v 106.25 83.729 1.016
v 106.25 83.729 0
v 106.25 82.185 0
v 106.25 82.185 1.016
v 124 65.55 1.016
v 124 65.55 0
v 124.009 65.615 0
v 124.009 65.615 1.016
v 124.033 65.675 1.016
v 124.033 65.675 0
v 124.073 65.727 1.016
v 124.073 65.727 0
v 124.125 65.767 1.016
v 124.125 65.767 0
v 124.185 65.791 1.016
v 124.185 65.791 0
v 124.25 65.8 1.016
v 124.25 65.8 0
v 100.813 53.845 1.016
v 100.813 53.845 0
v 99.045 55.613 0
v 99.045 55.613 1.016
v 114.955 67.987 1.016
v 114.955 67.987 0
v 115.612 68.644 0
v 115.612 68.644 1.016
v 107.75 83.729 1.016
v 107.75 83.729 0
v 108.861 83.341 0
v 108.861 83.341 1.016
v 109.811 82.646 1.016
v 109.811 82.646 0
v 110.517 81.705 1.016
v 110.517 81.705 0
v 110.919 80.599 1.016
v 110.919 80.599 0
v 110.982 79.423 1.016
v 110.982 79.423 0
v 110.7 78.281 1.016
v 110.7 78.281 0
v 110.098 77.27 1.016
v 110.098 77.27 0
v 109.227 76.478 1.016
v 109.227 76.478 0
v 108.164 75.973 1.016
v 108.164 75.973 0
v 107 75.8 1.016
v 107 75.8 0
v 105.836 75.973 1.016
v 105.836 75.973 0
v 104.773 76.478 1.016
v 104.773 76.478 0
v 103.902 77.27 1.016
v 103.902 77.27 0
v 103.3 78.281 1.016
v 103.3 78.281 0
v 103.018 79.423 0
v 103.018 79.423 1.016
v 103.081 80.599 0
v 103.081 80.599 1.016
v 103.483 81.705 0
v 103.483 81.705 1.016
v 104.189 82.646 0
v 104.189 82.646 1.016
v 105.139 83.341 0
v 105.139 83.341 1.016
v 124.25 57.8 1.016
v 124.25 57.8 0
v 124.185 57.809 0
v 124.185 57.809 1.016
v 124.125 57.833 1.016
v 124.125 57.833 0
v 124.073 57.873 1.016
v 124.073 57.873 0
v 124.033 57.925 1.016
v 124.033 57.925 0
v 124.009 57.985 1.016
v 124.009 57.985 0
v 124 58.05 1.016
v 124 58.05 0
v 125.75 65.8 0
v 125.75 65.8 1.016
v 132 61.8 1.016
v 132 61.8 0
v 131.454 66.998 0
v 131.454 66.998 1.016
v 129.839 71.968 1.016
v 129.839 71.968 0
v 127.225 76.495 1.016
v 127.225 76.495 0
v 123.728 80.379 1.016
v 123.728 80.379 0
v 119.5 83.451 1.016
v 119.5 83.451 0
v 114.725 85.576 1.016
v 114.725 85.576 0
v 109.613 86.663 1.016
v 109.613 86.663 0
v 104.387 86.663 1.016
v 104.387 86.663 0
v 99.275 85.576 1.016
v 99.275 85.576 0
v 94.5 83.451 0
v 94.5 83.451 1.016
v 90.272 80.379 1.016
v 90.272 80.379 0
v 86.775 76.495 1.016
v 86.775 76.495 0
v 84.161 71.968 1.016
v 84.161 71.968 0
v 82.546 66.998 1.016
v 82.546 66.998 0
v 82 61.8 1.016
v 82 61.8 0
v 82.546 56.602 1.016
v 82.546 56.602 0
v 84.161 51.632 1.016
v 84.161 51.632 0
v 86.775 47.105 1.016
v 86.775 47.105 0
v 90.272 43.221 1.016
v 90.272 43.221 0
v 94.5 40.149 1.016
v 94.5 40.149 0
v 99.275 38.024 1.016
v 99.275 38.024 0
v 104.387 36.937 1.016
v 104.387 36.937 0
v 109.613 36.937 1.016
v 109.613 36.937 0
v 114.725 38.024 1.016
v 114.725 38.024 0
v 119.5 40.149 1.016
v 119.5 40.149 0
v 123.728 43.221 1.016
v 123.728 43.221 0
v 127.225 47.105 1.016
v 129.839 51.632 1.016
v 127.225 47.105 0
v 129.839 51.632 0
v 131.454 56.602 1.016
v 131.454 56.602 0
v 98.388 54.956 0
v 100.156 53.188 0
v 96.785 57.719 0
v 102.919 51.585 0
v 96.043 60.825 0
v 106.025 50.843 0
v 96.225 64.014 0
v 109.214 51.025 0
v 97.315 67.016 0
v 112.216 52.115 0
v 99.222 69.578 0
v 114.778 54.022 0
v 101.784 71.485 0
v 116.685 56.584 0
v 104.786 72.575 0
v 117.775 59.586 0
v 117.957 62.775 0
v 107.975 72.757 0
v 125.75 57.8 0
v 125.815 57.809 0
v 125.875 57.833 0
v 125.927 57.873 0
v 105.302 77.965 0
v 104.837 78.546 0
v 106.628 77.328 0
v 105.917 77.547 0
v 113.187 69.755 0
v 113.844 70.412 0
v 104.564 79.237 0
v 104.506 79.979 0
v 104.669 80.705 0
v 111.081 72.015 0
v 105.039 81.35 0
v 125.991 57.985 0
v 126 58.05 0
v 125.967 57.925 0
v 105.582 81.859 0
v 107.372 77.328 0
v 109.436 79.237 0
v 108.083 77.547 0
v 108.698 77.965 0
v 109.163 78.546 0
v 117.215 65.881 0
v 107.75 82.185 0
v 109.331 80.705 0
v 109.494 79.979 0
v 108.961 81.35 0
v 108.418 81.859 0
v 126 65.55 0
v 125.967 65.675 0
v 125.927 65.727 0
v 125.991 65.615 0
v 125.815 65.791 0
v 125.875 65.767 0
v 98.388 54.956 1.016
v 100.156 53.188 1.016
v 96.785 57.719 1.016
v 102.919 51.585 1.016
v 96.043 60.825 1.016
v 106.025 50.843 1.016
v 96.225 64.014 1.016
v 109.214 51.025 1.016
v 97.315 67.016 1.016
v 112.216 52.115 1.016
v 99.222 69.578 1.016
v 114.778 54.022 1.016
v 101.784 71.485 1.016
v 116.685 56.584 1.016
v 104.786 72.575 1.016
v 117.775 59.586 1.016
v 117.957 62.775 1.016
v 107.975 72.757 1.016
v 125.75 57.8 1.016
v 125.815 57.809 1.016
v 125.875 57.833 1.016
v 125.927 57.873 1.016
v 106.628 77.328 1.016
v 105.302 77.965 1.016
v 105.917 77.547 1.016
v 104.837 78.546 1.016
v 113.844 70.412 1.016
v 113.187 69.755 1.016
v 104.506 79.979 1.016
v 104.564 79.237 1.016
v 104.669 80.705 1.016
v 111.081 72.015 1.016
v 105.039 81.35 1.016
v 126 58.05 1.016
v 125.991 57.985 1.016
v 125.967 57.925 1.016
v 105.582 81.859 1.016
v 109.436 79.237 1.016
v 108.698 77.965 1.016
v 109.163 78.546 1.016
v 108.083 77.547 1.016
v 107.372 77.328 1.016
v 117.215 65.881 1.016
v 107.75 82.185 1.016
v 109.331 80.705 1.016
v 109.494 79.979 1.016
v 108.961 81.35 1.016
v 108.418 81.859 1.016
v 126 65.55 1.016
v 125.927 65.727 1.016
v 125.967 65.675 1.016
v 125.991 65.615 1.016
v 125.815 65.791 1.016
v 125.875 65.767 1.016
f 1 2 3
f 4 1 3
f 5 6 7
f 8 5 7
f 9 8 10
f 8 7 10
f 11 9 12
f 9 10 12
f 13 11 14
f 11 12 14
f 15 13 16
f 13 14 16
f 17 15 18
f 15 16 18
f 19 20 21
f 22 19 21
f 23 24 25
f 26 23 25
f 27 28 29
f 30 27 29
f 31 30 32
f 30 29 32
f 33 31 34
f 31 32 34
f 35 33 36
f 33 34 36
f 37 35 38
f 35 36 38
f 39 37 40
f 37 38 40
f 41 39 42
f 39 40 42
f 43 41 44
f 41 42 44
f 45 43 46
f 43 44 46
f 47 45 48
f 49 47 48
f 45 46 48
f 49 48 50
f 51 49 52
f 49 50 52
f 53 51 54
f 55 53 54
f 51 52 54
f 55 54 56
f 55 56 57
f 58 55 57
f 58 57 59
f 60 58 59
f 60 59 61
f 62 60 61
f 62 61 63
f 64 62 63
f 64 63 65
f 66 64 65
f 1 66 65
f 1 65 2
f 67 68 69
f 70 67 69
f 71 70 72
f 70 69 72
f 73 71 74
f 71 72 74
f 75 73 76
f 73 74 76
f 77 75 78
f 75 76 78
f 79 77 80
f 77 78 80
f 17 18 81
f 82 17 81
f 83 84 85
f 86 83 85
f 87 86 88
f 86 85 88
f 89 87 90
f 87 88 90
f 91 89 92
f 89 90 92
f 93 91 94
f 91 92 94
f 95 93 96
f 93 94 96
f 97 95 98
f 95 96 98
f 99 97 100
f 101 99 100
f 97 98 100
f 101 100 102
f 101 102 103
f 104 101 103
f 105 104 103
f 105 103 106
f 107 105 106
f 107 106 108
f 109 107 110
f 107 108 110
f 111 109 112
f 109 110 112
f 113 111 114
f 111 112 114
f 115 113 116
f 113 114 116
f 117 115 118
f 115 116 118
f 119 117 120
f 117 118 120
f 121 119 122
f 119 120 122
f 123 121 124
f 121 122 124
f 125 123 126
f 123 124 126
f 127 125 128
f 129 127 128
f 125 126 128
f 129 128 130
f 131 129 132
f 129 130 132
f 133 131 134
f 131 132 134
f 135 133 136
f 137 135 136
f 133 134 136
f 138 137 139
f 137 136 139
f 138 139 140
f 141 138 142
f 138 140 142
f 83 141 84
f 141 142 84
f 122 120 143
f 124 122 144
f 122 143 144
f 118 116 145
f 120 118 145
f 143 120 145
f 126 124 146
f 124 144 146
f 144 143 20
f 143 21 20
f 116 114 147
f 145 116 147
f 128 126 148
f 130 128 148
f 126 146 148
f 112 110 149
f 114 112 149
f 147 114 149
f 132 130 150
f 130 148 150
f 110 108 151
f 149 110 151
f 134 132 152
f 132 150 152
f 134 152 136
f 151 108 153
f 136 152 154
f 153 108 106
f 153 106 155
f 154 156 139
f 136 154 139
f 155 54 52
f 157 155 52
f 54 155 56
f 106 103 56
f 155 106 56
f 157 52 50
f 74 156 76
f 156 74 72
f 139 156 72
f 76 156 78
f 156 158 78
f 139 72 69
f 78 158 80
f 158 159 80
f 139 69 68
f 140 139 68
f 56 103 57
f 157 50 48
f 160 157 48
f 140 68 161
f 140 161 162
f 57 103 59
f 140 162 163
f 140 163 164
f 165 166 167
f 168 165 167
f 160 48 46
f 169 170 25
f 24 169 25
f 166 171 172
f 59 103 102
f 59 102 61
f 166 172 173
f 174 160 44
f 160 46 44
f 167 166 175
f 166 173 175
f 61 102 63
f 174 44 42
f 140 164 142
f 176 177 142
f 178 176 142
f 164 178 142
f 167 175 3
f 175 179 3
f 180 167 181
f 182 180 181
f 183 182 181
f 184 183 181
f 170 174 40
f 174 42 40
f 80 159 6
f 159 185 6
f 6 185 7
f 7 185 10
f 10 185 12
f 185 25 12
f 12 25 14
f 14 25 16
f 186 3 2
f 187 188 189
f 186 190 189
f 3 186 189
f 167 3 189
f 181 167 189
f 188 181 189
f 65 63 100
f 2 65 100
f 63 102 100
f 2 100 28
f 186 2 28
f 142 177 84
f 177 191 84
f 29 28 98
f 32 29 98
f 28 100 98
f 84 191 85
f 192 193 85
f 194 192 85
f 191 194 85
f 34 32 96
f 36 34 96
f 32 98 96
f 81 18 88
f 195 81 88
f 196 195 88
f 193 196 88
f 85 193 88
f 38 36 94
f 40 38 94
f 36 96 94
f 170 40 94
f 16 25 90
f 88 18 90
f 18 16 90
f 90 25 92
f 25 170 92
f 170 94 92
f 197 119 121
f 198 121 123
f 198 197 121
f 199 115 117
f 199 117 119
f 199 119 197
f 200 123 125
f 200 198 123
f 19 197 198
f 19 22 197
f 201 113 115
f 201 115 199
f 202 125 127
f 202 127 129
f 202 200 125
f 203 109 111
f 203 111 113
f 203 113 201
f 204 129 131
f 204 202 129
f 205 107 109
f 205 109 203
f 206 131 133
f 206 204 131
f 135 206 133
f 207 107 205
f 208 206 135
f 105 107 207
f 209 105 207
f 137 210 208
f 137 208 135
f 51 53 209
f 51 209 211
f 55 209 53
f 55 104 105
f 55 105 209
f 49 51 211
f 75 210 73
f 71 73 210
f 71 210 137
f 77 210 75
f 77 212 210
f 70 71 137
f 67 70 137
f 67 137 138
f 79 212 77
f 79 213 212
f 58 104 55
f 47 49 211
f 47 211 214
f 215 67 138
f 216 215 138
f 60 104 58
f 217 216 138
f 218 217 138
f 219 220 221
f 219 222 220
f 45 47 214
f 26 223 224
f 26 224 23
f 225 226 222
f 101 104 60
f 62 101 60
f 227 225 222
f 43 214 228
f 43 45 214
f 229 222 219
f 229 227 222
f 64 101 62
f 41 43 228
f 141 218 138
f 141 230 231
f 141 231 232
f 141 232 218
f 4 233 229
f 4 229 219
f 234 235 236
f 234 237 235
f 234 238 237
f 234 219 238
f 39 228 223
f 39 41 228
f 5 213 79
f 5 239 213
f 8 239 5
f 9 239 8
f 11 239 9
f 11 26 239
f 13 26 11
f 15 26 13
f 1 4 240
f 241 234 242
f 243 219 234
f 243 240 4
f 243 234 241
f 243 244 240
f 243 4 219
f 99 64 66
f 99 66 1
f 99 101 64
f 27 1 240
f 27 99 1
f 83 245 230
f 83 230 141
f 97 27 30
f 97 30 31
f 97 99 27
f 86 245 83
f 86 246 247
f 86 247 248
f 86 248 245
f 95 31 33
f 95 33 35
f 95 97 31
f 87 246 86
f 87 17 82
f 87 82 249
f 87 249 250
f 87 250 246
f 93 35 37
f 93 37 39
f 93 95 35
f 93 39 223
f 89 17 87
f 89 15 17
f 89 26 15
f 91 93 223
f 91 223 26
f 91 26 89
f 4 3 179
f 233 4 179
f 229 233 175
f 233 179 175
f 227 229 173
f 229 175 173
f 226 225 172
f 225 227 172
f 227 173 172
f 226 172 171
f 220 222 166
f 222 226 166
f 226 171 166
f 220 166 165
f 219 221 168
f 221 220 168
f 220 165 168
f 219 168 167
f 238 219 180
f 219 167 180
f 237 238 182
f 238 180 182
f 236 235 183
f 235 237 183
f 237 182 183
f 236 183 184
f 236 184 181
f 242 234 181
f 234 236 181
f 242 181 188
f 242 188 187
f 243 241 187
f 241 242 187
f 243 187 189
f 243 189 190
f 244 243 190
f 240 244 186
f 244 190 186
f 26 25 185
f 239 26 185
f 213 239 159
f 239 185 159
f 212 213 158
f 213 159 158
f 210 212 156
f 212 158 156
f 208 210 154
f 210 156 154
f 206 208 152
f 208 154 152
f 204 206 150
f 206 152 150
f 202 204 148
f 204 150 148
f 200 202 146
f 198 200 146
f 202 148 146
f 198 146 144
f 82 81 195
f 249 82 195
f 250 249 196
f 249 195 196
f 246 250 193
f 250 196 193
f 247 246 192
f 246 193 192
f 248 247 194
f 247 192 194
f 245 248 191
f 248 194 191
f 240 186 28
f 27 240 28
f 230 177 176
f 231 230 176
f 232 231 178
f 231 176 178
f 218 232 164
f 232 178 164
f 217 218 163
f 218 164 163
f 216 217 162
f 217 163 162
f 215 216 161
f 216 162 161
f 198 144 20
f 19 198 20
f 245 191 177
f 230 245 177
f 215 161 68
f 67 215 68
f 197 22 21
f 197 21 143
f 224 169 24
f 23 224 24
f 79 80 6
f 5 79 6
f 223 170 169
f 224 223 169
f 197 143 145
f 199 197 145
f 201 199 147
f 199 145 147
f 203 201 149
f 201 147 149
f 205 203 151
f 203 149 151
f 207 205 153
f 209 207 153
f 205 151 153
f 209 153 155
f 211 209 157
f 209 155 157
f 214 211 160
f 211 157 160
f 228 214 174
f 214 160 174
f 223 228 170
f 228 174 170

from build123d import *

# Parameters (mm, degrees)
SKETCH1_R           = 25
BOSS_EXTRUDE1_DEPTH = 1.016
CUT_EXTRUDE1_DEPTH  = 158.985038077


with BuildPart() as part:
    # Sketch1 → Boss-Extrude1 (new body)
    with BuildSketch(Plane.XY):
        with Locations((107.000000001, 61.8)):
            Circle(SKETCH1_R)
        with BuildLine():
            Line((113.843907282, 70.411674235), (113.187184336, 69.754951288))
            Line((113.187184336, 69.754951288), (114.954951289, 67.987184335))
            Line((114.954951289, 67.987184335), (115.611674235, 68.643907282))
            ThreePointArc((115.611674235, 68.643907282), (114.778174594, 54.021825407), (100.156092719, 53.188325765))
            Line((100.156092719, 53.188325765), (100.812815665, 53.845048712))
            Line((100.812815665, 53.845048712), (99.045048712, 55.612815665))
            Line((99.045048712, 55.612815665), (98.388325766, 54.956092718))
            ThreePointArc((98.388325766, 54.956092718), (99.221825408, 69.578174593), (113.843907282, 70.411674235))
        make_face(mode=Mode.SUBTRACT)
    extrude(amount=BOSS_EXTRUDE1_DEPTH)

    # Sketch2 → Cut-Extrude1 (cut, through all)
    with BuildSketch(Plane.XY):
        with BuildLine():
            ThreePointArc((106.250000001, 82.184848004), (107.000000001, 77.3), (107.750000001, 82.184848004))
            Line((107.750000001, 82.184848004), (107.750000001, 83.729058411))
            ThreePointArc((107.750000001, 83.729058411), (107.000000001, 75.8), (106.250000001, 83.729058411))
            Line((106.250000001, 83.729058411), (106.250000001, 82.184848004))
        make_face()
        with BuildLine():
            ThreePointArc((124.000000001, 65.55), (124.073223305, 65.726776695), (124.250000001, 65.8))
            Line((124.250000001, 65.8), (125.750000001, 65.8))
            ThreePointArc((125.750000001, 65.8), (125.926776696, 65.726776695), (126.000000001, 65.55))
            Line((126.000000001, 65.55), (126.000000001, 58.05))
            ThreePointArc((126.000000001, 58.05), (125.926776696, 57.873223305), (125.750000001, 57.8))
            Line((125.750000001, 57.8), (124.250000001, 57.8))
            ThreePointArc((124.250000001, 57.8), (124.073223305, 57.873223305), (124.000000001, 58.05))
            Line((124.000000001, 58.05), (124.000000001, 65.55))
        make_face()
    extrude(amount=CUT_EXTRUDE1_DEPTH, mode=Mode.SUBTRACT)


solid = part.part
